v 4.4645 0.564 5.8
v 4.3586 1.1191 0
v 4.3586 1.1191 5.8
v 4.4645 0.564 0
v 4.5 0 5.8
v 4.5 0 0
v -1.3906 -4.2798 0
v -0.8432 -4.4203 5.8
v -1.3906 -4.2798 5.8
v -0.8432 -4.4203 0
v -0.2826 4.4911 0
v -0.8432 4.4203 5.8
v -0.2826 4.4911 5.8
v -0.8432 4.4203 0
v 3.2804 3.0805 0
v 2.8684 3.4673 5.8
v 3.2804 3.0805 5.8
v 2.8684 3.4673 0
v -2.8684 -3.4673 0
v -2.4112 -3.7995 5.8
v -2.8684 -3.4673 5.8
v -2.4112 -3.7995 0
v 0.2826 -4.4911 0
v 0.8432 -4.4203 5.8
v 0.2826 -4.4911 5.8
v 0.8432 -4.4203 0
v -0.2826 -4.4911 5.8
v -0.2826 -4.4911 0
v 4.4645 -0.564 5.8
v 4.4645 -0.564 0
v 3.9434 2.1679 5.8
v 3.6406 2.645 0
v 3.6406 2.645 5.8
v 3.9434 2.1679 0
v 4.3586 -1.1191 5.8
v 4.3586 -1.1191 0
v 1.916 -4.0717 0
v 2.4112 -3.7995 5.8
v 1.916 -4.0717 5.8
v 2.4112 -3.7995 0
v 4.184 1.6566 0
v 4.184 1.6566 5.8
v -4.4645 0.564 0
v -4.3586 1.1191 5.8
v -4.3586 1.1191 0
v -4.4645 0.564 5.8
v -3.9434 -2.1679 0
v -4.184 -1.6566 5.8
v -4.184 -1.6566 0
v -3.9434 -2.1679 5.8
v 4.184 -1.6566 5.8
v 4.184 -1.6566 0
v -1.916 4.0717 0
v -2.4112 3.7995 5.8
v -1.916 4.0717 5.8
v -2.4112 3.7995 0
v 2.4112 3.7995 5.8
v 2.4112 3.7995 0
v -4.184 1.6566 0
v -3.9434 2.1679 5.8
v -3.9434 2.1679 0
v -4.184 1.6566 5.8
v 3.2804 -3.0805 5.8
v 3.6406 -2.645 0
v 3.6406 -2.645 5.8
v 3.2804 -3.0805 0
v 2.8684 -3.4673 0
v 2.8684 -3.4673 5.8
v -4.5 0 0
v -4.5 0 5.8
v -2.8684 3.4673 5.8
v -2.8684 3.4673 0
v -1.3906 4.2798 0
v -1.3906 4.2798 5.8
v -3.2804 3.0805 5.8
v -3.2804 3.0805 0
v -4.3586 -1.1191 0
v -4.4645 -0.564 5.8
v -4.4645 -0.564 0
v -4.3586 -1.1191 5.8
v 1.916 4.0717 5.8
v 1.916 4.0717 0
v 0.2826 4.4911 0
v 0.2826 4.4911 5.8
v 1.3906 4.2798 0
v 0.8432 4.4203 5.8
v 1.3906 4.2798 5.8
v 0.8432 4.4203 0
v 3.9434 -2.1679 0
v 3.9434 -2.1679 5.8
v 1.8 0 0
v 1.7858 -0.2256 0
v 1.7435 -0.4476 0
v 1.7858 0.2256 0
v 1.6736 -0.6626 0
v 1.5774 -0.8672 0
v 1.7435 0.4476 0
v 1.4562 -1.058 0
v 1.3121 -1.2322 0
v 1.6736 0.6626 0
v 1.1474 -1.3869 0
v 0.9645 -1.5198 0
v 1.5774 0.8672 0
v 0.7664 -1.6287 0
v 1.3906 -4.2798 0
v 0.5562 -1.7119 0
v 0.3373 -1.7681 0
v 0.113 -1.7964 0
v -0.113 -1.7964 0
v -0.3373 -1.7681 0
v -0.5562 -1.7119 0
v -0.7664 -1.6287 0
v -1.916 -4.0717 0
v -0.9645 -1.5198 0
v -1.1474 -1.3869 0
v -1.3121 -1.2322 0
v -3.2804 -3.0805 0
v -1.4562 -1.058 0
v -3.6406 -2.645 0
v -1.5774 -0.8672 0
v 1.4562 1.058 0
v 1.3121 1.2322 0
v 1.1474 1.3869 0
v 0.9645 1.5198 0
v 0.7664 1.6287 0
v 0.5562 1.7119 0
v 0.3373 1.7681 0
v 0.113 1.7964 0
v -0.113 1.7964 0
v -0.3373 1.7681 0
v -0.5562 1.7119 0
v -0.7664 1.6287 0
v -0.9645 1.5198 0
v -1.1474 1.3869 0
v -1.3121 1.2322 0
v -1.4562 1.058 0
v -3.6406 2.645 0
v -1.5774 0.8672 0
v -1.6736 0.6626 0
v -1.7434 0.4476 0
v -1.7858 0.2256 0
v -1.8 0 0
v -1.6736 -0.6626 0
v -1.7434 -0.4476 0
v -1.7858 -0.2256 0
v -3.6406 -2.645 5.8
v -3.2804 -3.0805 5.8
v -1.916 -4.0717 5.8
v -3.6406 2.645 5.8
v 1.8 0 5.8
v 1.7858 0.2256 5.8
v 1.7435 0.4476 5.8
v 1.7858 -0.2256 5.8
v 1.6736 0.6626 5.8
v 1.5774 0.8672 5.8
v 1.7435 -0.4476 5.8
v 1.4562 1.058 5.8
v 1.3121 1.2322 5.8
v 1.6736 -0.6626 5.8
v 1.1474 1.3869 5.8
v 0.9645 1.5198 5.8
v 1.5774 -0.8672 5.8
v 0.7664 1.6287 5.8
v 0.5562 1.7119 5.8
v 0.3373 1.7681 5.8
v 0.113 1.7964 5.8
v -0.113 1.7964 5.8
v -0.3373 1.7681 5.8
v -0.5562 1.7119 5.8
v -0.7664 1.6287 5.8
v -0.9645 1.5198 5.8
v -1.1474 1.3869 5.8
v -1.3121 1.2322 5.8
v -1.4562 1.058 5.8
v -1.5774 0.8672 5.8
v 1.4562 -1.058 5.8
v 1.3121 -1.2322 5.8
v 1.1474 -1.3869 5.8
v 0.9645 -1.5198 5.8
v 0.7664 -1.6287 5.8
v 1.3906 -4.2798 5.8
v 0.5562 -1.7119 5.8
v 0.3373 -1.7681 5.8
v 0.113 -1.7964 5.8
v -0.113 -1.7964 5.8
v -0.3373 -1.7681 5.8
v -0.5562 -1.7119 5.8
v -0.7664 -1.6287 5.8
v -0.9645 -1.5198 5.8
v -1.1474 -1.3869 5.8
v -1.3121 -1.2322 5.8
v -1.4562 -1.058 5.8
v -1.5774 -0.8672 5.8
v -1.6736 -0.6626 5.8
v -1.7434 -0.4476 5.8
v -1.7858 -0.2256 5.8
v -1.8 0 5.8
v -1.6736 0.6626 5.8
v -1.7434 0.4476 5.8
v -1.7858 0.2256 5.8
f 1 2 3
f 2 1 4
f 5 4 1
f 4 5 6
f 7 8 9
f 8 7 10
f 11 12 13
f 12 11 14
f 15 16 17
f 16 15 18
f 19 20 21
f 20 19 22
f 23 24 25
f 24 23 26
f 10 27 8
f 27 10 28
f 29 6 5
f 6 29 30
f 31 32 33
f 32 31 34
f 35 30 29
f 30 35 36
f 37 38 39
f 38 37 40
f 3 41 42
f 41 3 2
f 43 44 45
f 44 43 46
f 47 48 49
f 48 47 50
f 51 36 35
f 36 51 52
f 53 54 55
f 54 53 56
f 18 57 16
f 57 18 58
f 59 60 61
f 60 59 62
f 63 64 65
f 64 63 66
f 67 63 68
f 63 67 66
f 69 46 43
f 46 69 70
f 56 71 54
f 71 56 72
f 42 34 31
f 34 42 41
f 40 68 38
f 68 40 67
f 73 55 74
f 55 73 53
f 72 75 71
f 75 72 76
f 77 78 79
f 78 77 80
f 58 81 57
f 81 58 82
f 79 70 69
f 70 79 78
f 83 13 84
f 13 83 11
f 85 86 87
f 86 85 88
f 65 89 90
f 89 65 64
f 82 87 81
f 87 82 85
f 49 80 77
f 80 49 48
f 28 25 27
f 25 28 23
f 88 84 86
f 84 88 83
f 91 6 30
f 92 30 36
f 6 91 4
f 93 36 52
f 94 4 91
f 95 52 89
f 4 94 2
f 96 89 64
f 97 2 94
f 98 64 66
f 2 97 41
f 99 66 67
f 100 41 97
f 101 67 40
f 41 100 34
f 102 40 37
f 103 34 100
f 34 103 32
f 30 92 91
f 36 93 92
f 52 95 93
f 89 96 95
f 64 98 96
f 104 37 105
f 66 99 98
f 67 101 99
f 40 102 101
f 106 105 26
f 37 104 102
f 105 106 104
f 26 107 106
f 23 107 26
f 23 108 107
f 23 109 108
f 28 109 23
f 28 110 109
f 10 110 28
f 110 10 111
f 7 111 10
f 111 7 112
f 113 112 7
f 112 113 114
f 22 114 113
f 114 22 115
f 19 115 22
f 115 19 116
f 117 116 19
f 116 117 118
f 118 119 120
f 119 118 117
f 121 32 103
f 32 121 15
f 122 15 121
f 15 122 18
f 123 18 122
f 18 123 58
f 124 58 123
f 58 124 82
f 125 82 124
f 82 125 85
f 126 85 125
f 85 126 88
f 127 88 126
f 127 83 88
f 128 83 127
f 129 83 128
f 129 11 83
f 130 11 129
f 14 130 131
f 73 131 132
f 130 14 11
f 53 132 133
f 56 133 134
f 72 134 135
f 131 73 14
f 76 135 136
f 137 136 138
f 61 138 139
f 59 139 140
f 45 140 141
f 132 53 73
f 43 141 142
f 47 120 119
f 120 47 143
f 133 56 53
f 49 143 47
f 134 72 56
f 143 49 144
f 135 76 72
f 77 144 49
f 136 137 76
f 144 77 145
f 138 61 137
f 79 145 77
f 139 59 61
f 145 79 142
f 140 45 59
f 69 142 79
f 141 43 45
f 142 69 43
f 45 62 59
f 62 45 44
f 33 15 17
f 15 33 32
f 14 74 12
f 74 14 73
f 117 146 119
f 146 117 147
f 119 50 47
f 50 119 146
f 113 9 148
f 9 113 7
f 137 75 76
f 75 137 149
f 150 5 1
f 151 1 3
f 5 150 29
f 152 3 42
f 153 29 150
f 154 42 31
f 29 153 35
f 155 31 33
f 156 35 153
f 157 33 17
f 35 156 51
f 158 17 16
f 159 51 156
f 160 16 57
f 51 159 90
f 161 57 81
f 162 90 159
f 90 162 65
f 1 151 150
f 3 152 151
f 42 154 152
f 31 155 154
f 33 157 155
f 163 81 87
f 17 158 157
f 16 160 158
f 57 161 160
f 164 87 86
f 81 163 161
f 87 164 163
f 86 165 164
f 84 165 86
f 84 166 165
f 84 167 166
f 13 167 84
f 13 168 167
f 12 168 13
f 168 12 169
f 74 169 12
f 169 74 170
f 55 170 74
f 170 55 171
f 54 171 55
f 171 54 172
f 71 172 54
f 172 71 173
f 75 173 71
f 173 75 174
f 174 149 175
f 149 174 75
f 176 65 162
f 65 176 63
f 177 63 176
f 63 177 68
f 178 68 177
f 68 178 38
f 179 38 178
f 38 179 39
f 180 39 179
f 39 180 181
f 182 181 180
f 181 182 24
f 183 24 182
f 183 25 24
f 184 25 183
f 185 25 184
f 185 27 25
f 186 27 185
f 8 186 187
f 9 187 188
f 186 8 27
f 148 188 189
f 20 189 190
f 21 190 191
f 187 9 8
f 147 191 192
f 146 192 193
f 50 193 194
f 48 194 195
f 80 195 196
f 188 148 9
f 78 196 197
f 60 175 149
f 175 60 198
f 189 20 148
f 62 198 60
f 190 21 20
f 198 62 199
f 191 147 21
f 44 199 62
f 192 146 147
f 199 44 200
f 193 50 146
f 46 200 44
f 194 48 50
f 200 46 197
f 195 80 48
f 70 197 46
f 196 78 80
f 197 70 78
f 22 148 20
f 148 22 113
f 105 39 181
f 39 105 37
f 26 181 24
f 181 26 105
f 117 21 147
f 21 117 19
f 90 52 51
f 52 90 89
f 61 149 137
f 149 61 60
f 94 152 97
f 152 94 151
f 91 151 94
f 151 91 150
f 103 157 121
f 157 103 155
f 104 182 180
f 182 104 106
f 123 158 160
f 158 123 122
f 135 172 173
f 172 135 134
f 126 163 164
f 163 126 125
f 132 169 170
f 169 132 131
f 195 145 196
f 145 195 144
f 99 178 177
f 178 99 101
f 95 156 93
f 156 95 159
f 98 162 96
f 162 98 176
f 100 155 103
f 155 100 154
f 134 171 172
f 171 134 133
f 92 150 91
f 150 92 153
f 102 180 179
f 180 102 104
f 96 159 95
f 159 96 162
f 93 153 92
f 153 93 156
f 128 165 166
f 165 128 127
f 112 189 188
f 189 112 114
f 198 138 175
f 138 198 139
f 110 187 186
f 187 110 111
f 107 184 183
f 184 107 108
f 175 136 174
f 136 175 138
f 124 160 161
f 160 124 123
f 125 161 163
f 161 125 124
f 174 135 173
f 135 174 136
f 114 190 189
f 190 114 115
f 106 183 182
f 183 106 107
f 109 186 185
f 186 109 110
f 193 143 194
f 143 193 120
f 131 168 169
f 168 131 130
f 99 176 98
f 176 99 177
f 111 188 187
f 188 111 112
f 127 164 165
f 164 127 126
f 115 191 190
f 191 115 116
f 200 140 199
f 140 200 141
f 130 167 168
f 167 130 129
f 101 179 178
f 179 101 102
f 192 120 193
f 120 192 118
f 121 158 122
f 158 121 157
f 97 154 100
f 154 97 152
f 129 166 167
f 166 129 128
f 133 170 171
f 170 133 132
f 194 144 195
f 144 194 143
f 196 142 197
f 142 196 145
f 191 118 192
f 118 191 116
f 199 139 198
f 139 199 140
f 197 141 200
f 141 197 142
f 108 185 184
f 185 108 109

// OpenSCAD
$fn = 50;

difference() {
	union() {
		translate(v = [22.5, -7.5, -3]) {
			rotate(a = [0, 0, 0]) {
				difference() {
					union() {
						translate(v = [-22.5, 7.5, 3.0]) {
							cylinder(h = 5.8, r = 4.5);
						}
					}
					union() {
						translate(v = [-22.5, 7.5, 2.9]) {
							cylinder(h = 6, r = 1.8);
						}
					}
				}
			}
		}
	}
	union();
}
